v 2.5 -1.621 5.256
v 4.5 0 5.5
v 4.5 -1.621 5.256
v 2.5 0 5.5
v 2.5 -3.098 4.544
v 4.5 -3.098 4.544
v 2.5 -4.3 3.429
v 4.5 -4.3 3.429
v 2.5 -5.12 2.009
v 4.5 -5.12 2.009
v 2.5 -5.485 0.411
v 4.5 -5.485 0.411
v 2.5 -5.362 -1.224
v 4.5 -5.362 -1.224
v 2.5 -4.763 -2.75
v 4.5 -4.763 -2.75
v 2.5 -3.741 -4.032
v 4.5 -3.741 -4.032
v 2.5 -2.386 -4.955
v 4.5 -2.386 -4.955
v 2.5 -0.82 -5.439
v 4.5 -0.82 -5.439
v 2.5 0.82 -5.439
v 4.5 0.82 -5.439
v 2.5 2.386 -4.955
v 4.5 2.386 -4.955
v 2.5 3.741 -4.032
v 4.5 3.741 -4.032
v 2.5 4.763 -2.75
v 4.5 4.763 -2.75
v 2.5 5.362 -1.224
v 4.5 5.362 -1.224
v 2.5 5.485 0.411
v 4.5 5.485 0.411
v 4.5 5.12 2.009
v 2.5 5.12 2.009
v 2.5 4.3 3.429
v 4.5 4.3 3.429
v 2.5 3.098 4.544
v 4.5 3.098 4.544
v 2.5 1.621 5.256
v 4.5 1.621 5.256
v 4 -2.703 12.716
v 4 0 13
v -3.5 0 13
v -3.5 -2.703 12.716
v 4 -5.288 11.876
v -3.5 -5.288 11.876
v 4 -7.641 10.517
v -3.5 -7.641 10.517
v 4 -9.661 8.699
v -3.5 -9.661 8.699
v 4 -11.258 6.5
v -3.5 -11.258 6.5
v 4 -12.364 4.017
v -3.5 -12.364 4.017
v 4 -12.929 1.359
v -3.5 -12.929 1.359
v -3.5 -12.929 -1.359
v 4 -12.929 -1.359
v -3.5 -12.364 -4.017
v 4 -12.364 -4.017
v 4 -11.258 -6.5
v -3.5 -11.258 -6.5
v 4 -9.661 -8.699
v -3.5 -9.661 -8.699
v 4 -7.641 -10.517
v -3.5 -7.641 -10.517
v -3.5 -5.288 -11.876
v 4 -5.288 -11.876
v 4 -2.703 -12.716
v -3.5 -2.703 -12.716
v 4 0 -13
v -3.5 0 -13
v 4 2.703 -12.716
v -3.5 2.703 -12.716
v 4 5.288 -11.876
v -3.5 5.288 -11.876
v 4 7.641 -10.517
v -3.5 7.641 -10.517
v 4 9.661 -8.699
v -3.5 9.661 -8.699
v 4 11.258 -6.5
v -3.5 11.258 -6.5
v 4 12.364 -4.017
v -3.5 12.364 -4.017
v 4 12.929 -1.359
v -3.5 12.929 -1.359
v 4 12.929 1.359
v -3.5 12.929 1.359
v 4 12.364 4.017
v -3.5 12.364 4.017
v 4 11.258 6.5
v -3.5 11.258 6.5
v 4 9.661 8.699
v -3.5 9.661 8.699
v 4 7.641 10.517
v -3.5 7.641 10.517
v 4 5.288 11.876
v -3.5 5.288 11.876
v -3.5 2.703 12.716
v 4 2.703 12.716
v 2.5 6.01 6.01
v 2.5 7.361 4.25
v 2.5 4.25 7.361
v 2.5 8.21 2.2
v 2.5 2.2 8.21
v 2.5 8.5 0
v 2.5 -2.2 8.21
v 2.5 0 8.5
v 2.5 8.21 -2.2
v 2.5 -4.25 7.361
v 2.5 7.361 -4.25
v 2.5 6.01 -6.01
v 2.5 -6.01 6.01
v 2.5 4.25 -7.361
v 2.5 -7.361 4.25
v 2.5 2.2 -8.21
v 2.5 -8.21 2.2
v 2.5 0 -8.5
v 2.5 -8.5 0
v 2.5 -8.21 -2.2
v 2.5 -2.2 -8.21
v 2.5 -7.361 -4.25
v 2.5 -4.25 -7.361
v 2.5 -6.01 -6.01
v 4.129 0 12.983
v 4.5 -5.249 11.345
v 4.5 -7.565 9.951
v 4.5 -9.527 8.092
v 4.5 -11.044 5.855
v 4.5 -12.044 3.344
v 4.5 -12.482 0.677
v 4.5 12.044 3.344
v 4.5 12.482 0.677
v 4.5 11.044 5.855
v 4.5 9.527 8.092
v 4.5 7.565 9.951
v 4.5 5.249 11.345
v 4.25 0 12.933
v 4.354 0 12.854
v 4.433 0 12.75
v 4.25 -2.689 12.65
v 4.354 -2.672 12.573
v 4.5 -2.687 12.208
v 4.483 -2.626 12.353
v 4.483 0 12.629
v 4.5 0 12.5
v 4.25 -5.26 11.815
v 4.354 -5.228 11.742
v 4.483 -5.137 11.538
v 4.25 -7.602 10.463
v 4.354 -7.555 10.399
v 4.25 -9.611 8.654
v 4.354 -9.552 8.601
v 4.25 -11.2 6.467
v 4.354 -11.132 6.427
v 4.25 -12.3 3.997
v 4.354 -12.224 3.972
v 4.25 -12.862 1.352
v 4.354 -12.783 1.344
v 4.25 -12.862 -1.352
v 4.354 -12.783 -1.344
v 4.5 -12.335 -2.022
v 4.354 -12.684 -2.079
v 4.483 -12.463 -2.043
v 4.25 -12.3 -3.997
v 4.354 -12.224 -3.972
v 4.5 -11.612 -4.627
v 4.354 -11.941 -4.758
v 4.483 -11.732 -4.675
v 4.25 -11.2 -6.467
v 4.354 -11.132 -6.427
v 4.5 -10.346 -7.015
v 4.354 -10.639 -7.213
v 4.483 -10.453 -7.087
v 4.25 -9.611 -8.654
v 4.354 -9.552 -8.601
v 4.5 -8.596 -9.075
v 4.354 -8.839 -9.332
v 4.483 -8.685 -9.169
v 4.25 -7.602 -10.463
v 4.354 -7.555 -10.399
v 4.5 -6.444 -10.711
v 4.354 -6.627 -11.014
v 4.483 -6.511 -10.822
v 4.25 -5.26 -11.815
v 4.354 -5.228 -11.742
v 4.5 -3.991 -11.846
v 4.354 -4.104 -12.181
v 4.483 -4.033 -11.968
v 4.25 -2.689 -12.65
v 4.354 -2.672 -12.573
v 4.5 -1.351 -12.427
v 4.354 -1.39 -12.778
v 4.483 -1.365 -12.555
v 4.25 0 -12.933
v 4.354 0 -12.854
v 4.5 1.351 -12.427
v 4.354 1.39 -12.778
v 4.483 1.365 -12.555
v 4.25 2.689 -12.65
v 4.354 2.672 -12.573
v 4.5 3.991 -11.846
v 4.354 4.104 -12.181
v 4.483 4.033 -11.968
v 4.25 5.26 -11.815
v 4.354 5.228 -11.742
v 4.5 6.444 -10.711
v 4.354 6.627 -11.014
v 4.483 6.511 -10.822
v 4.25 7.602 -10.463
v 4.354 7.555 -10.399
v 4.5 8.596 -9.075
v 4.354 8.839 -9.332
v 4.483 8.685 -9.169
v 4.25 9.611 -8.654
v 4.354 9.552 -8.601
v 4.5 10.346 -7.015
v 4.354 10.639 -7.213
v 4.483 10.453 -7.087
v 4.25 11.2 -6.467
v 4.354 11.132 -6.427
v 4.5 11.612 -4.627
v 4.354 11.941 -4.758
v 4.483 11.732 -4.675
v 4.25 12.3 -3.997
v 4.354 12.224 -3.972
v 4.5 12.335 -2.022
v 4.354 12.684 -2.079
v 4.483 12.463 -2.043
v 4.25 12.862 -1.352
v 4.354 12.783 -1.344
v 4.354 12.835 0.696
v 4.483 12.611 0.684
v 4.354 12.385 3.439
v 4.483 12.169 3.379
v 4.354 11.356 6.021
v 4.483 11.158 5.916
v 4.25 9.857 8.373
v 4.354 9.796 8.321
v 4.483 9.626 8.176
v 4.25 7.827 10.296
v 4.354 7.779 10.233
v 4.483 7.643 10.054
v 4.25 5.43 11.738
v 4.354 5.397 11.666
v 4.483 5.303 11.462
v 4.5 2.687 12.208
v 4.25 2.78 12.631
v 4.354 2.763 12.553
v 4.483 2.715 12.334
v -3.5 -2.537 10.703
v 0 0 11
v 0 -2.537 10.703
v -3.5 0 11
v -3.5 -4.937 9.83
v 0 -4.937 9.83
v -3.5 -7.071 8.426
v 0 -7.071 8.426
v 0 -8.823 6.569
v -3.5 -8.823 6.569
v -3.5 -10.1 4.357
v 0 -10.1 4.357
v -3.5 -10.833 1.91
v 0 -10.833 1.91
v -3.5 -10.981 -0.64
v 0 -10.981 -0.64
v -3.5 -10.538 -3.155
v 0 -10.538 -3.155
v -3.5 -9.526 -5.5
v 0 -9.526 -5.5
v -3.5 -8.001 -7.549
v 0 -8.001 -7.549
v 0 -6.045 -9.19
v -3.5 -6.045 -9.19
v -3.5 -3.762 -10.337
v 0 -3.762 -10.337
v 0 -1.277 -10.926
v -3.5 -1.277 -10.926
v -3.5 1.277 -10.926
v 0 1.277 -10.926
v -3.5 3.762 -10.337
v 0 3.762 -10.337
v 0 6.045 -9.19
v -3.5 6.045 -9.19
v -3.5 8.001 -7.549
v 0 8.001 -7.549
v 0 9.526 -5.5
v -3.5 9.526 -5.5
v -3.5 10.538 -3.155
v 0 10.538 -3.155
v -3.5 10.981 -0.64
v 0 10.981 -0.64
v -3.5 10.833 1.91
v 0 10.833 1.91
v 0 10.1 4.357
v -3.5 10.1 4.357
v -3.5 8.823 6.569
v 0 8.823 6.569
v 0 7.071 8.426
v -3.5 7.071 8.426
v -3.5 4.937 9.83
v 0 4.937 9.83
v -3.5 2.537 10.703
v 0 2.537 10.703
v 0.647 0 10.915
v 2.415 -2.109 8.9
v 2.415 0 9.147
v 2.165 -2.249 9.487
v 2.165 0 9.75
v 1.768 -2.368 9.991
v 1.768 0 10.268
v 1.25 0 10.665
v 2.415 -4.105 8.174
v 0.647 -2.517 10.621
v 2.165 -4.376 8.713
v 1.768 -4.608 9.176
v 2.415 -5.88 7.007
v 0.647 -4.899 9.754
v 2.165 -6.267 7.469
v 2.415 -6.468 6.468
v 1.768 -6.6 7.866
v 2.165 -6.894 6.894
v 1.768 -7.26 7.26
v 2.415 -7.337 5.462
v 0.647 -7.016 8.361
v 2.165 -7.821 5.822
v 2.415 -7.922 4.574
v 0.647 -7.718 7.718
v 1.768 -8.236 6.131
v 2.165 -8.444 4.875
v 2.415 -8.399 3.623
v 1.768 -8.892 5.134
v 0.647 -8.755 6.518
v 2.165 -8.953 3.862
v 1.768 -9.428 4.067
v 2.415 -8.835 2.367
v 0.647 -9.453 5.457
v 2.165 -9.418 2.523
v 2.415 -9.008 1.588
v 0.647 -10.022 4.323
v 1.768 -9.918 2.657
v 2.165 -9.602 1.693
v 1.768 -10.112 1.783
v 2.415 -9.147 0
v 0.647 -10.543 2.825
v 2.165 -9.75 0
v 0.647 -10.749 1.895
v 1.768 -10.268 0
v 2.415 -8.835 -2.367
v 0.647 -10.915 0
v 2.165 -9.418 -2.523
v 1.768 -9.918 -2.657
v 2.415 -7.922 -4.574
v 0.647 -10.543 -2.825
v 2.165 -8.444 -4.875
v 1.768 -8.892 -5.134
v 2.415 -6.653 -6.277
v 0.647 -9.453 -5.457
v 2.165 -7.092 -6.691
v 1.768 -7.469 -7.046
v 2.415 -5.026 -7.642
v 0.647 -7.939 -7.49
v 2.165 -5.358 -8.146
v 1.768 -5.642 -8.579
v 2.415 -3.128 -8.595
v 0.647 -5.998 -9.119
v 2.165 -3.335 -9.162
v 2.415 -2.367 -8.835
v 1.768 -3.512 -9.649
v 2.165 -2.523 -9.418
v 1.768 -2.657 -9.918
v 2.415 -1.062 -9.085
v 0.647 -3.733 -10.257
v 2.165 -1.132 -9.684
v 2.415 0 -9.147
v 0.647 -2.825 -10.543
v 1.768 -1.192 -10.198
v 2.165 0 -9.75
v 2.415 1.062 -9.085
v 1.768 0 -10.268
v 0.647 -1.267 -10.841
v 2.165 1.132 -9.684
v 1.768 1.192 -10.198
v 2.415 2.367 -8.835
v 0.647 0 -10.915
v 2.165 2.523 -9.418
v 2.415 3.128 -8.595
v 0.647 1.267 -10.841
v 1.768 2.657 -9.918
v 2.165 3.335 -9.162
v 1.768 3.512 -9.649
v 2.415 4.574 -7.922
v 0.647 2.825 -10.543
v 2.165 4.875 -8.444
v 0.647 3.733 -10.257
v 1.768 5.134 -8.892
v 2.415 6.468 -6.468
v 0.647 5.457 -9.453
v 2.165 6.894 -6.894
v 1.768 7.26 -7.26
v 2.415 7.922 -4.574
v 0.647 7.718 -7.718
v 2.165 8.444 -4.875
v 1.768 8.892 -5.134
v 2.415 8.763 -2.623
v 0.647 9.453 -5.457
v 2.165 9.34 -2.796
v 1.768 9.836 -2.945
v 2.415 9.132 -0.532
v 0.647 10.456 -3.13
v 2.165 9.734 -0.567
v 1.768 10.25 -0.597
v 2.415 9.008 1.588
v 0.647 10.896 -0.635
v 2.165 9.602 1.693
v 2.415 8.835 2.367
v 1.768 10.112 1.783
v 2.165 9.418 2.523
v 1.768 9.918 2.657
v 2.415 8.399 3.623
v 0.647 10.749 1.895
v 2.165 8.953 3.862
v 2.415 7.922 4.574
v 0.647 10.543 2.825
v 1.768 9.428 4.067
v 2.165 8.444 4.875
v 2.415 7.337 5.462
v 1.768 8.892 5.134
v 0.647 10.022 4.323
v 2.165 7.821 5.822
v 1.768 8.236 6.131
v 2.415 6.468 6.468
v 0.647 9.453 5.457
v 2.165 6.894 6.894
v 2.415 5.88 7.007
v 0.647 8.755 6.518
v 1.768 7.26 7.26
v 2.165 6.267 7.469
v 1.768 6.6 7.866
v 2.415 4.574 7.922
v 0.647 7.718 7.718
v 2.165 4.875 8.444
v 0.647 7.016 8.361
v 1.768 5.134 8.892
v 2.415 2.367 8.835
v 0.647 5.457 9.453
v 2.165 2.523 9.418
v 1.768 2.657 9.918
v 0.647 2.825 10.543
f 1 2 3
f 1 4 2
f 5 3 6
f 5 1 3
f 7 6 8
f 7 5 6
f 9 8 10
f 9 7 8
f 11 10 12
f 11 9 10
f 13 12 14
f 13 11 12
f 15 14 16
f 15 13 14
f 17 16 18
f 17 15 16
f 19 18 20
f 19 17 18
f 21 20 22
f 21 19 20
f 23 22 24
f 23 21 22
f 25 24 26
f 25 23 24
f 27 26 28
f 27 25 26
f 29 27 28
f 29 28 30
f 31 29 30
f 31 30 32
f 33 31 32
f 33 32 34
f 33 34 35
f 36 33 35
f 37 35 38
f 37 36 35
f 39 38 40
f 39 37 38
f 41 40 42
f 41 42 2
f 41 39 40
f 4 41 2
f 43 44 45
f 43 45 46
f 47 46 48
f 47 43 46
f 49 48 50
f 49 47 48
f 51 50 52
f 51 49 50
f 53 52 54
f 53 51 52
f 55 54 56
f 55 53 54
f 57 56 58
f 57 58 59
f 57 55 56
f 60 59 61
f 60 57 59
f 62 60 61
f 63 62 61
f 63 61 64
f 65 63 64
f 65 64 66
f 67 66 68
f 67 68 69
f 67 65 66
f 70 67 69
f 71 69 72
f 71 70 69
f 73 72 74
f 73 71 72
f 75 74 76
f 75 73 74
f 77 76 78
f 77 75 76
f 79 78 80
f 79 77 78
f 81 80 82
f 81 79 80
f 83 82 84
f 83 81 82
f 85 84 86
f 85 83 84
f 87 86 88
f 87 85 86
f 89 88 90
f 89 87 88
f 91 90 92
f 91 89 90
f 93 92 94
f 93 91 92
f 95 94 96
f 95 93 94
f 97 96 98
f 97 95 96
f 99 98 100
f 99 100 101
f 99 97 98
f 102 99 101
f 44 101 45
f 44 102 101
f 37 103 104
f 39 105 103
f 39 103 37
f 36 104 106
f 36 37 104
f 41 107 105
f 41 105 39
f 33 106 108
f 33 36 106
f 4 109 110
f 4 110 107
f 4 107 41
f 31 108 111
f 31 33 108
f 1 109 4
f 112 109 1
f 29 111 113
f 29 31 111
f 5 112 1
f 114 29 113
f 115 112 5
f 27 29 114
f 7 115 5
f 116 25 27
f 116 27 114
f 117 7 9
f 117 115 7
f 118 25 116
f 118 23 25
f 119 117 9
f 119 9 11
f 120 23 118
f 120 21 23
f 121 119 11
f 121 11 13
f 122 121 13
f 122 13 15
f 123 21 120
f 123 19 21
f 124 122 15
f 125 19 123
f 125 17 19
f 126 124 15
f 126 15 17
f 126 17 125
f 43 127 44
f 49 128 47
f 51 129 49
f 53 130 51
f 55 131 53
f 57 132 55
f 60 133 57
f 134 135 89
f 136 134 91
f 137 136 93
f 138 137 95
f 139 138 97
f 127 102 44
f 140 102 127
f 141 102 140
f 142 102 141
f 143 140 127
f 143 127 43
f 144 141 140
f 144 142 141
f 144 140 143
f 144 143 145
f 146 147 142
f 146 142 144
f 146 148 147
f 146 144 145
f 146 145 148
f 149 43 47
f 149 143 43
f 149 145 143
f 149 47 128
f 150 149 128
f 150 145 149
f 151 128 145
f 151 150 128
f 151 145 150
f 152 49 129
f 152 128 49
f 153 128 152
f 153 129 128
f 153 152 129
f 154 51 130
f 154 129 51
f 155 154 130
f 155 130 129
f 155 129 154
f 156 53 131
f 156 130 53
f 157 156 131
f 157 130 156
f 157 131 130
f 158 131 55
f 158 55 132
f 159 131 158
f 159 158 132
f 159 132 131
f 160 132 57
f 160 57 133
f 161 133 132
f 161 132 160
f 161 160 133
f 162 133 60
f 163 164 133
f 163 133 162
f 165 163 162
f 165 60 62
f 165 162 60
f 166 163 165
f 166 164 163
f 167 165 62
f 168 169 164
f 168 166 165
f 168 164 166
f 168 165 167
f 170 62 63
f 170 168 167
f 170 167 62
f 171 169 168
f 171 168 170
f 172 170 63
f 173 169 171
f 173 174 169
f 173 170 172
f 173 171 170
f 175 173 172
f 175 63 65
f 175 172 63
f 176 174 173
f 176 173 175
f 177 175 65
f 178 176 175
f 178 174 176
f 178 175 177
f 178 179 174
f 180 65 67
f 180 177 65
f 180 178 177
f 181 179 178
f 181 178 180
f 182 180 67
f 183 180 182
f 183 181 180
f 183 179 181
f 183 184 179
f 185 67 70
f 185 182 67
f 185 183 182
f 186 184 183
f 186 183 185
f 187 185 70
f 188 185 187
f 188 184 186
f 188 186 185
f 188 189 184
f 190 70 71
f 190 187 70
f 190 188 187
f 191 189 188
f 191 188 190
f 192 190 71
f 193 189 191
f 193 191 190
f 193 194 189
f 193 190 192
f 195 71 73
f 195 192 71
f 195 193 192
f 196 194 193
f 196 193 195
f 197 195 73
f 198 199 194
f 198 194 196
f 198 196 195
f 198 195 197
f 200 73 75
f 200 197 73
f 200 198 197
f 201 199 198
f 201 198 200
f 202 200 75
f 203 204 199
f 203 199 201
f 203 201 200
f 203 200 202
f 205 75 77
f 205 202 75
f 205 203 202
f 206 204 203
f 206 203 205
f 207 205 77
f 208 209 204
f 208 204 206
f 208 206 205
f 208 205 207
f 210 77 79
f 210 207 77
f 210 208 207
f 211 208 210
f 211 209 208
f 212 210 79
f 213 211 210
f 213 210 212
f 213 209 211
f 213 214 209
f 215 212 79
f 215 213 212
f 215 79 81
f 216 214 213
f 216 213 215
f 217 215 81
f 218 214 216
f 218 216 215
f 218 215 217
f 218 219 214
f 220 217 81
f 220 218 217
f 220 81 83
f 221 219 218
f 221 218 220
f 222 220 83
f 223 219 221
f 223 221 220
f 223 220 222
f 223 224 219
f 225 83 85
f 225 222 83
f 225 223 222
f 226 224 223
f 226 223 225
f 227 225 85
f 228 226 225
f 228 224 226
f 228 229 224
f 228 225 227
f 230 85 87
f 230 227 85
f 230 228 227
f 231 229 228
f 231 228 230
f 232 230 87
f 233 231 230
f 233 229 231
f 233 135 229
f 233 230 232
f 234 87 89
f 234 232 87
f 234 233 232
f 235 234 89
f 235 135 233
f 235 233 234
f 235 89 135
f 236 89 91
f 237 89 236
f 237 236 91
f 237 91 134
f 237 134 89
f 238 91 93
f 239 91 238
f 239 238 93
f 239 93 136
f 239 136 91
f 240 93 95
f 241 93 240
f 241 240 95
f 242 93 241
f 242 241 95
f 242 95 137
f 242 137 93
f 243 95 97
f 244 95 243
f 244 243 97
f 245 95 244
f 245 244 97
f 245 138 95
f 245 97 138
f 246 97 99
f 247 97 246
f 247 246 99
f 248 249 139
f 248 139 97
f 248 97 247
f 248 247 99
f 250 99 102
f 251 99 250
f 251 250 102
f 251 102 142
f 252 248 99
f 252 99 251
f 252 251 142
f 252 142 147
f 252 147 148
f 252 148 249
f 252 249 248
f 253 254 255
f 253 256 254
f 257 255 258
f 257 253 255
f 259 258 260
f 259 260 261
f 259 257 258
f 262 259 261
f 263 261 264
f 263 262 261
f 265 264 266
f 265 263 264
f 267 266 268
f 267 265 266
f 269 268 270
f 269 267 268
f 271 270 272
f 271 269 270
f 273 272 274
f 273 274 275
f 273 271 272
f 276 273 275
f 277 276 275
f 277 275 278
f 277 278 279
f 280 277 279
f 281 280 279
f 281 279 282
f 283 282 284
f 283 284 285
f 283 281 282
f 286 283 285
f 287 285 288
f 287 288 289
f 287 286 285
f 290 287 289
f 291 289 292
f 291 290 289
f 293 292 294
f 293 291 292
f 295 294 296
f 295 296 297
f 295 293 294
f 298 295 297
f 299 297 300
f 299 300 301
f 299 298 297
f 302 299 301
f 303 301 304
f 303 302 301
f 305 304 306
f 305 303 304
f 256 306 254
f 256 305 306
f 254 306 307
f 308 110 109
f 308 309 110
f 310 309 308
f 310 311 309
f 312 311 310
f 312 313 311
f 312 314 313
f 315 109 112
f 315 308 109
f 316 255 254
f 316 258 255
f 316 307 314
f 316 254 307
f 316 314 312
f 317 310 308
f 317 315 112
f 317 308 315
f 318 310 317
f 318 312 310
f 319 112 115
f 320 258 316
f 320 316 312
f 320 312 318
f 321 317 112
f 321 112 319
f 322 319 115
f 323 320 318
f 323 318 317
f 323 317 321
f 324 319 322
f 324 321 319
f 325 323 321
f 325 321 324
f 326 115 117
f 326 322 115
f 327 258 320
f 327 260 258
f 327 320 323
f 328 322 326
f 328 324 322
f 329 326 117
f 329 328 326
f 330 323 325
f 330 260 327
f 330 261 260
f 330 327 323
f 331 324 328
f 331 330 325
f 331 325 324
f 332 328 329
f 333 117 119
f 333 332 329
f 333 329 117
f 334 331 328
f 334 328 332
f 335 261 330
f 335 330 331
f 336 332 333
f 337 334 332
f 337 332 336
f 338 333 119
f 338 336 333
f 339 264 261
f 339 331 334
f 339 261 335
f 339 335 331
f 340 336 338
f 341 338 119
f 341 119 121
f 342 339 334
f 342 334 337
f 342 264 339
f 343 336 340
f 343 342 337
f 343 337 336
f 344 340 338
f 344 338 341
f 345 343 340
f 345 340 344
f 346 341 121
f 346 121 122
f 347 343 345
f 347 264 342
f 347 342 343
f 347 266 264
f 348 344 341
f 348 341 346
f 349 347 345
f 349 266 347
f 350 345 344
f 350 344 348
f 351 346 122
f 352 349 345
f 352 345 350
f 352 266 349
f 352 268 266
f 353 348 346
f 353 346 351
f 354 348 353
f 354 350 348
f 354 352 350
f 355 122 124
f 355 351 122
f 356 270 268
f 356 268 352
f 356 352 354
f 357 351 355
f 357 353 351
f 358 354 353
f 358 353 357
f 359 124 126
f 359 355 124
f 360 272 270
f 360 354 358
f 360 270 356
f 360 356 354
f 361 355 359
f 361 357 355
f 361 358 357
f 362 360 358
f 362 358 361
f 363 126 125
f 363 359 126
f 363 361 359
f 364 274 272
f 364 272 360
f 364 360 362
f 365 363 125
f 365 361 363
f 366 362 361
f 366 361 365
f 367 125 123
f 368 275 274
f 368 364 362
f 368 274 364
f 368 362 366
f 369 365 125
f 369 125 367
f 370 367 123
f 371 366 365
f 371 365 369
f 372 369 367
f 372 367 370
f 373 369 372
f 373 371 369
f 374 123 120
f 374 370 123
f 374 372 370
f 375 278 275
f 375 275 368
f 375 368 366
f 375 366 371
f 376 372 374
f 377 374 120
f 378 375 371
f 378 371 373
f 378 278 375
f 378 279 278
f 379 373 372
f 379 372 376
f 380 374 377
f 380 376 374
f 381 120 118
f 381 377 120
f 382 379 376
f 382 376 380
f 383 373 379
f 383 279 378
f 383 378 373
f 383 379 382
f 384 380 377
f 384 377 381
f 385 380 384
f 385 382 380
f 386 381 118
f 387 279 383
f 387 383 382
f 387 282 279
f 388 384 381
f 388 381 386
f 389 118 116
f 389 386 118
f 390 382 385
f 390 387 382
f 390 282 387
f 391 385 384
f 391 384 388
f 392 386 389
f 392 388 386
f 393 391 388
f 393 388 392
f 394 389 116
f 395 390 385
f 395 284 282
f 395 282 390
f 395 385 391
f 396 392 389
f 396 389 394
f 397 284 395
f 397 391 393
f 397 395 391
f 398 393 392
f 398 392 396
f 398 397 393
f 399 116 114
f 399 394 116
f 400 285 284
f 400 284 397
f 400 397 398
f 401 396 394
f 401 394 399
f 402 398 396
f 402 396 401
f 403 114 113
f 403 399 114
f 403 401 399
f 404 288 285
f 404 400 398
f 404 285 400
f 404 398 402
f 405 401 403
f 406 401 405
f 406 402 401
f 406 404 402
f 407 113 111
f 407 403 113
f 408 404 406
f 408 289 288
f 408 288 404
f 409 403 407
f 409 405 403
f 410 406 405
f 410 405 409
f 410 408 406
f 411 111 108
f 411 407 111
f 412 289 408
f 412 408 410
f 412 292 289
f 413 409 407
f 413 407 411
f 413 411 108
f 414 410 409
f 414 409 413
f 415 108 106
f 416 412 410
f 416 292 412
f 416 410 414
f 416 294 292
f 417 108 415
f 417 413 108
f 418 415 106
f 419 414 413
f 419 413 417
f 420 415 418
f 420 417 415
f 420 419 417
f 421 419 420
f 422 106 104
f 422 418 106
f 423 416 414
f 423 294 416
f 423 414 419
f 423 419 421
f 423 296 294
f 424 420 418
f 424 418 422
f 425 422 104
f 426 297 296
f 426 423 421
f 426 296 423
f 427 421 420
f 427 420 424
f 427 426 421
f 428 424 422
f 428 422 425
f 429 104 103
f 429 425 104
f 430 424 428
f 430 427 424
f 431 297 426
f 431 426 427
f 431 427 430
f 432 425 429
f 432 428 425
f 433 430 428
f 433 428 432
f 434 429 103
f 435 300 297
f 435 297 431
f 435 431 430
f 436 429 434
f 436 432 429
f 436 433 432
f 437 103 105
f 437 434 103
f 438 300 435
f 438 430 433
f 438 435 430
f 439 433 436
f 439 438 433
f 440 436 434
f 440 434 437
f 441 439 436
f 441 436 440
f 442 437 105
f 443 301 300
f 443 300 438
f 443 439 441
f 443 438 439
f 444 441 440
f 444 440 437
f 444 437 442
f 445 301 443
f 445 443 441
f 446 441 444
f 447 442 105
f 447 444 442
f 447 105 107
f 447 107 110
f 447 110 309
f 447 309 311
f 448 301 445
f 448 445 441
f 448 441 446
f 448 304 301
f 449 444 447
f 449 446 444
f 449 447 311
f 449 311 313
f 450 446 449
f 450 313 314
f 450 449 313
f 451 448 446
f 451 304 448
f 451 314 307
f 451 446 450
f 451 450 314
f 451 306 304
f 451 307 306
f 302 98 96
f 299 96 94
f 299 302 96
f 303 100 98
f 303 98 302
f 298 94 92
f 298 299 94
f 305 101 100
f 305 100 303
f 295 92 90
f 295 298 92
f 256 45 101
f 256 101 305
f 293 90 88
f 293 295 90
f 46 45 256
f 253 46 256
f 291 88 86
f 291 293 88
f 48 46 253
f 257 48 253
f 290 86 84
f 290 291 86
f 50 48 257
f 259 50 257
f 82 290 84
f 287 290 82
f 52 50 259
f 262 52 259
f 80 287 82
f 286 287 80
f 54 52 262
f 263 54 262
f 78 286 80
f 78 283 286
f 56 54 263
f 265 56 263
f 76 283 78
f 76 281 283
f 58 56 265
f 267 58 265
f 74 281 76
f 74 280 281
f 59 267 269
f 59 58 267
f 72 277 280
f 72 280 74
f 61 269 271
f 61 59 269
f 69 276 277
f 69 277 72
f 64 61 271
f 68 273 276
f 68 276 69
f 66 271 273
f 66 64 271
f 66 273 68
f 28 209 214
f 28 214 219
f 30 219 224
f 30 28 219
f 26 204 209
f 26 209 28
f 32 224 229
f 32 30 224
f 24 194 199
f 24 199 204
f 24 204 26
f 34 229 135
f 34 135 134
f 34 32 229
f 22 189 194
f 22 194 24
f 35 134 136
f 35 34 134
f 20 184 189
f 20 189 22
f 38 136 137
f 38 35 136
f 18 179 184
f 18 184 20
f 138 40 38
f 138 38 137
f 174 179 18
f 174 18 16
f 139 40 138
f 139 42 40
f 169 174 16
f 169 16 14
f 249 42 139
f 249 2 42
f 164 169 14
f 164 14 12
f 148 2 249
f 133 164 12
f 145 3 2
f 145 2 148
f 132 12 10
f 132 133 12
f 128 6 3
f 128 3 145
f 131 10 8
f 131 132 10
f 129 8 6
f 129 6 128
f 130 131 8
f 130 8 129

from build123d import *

# Parameters (mm, degrees)
CONG_1_R = 0.5


with BuildPart() as part:
    # Esquisse1 → Révolution1 (revolve)
    with BuildSketch(Plane.XY, mode=Mode.PRIVATE) as r_volution1_sk:
        with BuildLine():
            Line((-3.5, 13), (4.5, 13))
            Line((4.5, 13), (4.5, 5.5))
            Line((4.5, 5.5), (2.5, 5.5))
            Line((2.5, 5.5), (2.5, 8.5))
            ThreePointArc((2.5, 8.5), (1.767766953, 10.267766953), (0, 11))
            Line((0, 11), (-3.5, 11))
            Line((-3.5, 11), (-3.5, 13))
        make_face()
    revolve(r_volution1_sk.sketch.rotate(Axis((-12.986342457, 0, 0), (1, 0, 0)), 90), axis=Axis((-12.986342457, 0, 0), (1, 0, 0)))  # turned: the seam where the file's is

    # Congé1
    cong_1_edges = [part.edges().sort_by_distance(p)[0] for p in [
        (4.5, 0, -13),
    ]]
    fillet(cong_1_edges, radius=CONG_1_R)


solid = part.part
